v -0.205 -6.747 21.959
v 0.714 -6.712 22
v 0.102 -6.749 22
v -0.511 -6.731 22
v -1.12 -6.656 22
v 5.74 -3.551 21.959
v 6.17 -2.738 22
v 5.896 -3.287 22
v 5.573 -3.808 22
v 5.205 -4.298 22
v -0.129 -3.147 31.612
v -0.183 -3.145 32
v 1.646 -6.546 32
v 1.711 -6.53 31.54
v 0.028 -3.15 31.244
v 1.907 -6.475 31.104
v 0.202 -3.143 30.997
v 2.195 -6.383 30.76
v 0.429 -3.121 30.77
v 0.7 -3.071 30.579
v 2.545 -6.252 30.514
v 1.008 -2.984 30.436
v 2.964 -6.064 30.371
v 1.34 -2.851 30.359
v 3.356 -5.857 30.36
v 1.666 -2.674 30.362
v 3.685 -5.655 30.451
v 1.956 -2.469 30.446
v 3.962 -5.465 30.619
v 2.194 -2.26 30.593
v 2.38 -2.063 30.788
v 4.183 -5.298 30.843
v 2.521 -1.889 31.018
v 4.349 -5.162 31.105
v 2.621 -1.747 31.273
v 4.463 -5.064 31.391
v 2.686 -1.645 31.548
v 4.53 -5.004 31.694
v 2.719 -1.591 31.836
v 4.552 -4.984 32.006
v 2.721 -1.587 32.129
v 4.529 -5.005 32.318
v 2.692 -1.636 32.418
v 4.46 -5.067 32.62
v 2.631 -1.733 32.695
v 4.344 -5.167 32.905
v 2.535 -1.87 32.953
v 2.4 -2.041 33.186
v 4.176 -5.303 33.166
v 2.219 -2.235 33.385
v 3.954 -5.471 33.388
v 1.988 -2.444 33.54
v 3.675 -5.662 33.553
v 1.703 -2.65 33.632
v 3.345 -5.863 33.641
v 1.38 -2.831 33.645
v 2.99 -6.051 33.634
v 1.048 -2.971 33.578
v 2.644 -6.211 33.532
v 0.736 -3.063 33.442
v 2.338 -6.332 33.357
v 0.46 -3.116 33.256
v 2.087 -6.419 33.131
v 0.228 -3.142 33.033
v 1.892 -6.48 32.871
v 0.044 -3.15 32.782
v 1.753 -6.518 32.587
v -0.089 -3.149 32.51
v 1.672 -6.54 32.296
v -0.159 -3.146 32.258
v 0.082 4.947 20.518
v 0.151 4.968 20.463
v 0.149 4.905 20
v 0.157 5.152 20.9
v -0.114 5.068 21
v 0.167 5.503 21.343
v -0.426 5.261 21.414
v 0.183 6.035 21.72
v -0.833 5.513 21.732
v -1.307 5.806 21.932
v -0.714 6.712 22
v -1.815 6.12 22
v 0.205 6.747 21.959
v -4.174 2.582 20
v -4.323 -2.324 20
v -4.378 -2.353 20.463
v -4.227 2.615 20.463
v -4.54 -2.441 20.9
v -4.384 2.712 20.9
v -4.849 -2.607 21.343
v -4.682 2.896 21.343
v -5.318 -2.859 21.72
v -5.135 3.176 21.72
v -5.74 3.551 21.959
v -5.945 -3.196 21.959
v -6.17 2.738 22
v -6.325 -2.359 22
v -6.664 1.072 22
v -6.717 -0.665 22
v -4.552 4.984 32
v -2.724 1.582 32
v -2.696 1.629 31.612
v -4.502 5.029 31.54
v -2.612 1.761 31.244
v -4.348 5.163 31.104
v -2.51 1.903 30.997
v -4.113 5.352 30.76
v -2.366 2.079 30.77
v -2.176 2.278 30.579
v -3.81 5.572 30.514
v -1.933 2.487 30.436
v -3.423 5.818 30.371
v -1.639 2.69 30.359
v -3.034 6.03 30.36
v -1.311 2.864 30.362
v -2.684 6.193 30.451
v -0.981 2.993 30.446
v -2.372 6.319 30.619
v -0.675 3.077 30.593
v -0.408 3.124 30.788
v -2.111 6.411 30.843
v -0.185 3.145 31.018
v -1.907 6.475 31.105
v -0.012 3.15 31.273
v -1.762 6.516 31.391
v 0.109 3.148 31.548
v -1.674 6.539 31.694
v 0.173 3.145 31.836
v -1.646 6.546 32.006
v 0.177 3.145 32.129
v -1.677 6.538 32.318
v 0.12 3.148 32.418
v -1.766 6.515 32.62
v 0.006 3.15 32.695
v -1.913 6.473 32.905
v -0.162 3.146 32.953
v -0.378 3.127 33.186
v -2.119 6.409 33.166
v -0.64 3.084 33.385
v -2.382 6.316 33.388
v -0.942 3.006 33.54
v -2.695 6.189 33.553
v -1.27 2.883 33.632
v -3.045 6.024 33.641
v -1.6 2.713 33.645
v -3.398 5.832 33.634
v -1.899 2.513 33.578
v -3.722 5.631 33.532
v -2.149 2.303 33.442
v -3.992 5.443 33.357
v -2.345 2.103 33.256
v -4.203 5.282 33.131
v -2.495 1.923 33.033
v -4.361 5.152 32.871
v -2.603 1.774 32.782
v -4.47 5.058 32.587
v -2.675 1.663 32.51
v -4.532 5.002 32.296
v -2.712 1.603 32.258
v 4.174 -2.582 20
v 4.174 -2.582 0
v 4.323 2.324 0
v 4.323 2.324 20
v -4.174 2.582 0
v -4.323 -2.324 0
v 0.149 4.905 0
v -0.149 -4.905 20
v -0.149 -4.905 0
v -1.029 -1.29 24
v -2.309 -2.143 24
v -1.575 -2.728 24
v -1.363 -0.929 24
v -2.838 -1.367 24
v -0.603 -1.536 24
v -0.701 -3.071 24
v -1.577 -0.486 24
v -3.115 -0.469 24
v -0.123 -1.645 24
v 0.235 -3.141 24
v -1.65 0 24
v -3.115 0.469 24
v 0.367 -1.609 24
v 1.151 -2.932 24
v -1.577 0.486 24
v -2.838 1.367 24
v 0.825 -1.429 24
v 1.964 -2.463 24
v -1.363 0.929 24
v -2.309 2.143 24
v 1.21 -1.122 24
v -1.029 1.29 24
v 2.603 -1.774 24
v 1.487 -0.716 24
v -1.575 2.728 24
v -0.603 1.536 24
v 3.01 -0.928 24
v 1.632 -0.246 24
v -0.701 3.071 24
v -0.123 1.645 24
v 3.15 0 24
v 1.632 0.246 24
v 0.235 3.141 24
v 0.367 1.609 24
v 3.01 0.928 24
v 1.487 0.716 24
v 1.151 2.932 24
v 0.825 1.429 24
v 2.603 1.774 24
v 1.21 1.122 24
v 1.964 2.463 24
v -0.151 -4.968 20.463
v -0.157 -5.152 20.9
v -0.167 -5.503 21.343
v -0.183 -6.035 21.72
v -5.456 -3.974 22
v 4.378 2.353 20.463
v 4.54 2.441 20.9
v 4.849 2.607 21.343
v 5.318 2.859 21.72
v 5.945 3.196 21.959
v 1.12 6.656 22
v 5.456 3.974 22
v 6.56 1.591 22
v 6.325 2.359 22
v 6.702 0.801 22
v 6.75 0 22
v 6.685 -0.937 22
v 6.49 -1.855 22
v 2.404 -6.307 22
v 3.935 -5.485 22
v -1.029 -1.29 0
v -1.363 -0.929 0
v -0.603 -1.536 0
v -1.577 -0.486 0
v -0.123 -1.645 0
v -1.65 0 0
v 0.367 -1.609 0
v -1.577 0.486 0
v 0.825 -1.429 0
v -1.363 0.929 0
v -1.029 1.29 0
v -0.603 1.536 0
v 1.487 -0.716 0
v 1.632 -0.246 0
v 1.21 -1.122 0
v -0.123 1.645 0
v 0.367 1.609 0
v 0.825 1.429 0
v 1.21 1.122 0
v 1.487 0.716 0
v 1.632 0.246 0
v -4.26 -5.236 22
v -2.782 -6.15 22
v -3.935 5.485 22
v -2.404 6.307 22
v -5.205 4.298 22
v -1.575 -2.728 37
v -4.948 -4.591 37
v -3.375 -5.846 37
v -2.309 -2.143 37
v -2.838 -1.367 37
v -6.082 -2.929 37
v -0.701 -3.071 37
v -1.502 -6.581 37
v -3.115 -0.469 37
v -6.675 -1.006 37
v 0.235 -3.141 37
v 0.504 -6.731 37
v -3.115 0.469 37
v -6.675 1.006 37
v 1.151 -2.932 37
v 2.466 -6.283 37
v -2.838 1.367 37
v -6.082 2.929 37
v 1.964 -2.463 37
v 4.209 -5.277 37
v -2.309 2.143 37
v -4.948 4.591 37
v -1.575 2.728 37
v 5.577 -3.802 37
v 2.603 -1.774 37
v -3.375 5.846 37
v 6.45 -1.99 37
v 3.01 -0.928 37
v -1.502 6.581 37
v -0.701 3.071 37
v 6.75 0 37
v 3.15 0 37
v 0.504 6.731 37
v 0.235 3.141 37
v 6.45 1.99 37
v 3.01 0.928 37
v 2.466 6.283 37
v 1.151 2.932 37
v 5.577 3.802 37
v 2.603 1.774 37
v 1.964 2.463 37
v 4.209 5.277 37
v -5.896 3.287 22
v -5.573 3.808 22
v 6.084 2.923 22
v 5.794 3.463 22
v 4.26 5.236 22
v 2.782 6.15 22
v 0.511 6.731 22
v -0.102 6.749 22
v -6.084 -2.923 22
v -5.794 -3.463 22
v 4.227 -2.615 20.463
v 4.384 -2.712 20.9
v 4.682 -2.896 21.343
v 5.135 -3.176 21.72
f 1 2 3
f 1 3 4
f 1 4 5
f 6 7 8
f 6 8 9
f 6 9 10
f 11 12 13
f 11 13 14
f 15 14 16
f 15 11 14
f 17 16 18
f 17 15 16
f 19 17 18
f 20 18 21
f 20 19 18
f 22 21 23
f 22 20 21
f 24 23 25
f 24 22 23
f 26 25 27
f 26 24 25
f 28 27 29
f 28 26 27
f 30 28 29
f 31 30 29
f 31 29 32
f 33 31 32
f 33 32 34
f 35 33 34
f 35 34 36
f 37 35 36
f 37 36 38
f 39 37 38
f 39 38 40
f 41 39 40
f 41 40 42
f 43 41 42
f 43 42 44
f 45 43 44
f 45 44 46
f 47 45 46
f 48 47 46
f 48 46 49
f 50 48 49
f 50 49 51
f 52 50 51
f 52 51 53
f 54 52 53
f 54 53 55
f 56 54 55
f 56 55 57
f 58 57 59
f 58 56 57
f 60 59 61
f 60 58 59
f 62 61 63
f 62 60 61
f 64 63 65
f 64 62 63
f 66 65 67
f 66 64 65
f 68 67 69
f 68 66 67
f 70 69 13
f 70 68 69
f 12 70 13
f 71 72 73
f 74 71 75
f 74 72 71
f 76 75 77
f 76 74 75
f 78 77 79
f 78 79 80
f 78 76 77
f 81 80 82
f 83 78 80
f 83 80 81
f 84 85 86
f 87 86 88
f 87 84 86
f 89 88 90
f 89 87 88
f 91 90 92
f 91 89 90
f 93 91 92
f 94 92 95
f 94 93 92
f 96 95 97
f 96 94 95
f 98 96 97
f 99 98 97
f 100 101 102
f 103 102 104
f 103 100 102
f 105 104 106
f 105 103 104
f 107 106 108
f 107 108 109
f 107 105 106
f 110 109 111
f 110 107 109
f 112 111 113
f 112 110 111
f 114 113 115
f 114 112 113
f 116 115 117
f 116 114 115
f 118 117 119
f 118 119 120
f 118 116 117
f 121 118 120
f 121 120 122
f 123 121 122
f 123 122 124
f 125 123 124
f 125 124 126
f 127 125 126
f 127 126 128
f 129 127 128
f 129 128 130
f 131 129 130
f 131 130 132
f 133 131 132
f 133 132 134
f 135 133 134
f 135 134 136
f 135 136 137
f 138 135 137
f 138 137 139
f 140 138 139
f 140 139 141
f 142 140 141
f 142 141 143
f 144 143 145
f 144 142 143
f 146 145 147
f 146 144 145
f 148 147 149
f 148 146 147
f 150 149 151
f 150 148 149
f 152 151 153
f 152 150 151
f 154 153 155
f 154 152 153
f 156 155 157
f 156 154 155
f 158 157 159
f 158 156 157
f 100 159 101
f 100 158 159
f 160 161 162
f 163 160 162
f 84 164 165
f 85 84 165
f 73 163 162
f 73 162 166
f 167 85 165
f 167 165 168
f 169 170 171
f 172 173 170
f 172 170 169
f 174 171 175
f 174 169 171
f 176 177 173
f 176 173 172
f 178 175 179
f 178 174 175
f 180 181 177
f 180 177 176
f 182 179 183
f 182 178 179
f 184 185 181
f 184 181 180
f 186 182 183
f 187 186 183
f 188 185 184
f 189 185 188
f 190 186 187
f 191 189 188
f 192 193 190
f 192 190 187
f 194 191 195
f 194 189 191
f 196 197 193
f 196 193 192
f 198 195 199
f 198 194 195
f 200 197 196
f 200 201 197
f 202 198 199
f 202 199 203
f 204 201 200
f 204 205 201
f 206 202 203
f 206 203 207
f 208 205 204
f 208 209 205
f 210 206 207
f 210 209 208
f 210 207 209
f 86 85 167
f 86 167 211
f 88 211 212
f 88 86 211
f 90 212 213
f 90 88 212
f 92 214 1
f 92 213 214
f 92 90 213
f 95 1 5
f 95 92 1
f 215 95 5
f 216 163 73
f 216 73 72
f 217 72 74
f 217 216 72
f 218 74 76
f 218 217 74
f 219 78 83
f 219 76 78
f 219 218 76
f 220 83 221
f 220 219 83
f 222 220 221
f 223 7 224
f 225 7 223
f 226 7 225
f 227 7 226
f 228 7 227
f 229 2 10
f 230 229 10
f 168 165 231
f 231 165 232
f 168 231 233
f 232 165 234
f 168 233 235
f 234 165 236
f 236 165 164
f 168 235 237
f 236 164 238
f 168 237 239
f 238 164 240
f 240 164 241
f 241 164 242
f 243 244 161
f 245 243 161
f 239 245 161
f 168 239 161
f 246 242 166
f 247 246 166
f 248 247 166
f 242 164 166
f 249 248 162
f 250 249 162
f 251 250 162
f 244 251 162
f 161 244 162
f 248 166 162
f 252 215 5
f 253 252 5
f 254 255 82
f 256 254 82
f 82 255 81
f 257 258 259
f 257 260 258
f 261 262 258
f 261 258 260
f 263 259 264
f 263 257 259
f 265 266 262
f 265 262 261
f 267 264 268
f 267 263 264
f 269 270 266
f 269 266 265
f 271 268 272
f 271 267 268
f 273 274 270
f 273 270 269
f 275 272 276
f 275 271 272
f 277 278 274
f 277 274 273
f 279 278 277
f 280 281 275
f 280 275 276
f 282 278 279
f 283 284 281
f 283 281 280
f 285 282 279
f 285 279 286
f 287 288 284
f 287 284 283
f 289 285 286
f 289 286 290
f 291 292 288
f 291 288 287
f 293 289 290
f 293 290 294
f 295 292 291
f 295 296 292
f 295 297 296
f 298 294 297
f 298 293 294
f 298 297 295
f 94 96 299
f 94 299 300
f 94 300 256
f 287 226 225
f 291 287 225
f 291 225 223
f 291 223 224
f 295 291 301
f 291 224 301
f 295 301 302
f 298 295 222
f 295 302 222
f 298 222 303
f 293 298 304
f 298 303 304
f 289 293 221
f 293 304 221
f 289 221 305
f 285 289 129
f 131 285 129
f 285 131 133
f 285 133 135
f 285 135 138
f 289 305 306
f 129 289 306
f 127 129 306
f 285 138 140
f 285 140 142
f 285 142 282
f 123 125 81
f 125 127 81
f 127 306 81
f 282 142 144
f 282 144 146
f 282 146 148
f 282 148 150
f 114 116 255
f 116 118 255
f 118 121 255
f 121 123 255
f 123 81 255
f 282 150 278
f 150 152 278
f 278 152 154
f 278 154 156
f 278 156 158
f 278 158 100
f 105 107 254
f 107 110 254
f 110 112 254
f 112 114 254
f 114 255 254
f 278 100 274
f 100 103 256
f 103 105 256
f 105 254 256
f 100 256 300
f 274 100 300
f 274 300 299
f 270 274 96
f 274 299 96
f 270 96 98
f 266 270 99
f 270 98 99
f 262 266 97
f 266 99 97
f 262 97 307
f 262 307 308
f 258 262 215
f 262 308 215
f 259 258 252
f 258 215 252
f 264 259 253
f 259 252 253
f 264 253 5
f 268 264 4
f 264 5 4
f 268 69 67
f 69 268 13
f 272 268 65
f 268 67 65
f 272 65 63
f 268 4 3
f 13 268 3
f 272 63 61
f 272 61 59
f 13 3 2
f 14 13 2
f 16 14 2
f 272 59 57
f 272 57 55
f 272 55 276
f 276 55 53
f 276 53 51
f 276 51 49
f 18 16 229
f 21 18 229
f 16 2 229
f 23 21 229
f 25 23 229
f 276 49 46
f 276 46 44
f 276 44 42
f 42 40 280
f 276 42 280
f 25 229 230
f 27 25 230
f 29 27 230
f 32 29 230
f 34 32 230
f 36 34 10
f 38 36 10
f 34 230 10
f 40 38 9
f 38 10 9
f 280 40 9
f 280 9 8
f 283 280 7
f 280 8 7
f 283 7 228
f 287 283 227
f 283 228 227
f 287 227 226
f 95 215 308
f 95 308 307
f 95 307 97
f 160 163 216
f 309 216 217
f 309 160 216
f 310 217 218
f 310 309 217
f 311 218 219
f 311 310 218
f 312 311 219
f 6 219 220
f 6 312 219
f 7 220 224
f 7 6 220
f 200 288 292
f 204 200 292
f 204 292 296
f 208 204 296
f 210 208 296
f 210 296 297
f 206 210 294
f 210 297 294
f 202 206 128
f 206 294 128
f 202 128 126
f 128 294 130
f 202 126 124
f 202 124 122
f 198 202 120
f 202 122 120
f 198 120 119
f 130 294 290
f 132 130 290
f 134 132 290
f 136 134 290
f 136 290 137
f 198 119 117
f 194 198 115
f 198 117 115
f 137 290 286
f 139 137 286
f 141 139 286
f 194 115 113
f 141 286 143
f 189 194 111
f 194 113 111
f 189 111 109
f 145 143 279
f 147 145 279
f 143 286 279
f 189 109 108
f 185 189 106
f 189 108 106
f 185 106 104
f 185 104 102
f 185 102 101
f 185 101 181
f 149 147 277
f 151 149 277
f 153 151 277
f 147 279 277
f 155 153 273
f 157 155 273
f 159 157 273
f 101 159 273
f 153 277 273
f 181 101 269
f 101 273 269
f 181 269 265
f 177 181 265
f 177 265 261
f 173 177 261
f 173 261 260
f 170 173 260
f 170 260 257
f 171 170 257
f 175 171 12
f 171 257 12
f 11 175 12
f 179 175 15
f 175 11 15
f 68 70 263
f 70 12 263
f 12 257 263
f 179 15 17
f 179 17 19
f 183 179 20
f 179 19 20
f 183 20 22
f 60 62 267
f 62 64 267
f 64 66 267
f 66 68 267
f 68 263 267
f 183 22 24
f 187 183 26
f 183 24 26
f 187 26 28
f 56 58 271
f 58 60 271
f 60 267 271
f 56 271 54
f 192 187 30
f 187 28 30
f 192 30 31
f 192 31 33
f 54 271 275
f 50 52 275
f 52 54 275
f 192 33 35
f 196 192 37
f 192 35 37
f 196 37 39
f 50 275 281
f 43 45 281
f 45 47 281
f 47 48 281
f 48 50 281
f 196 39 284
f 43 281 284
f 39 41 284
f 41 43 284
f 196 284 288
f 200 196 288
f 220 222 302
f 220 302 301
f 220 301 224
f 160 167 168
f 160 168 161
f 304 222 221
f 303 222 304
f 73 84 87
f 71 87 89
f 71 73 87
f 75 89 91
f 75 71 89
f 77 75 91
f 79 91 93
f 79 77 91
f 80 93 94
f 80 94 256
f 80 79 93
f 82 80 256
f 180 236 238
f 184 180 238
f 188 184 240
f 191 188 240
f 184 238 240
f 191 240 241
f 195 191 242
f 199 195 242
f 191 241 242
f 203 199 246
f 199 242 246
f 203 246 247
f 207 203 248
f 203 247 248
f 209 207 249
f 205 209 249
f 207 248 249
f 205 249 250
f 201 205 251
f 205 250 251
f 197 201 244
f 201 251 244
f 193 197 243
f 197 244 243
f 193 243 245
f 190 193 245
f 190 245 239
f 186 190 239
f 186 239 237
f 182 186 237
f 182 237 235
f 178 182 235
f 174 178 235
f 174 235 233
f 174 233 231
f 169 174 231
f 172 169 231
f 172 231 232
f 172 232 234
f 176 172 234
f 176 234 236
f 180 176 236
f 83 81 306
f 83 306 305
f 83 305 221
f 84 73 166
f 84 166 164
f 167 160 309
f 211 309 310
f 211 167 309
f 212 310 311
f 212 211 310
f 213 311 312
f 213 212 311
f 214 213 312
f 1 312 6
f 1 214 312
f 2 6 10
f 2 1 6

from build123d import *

# Parameters (mm, degrees)
BOSS_EXTRUDE1_DEPTH     = 22
SKETCH2_R               = 6.75
BOSS_EXTRUDE2_DEPTH     = 15
SKETCH3_R               = 3.15
CUT_EXTRUDE1_DEPTH      = 13
FILLET2_R               = 2
CUT_EXTRUDE2_DEPTH      = 15
CUT_EXTRUDE2_DEPTH_BACK = 15
SKETCH8_R               = 1.65
SKETCH9_R               = 1.65
CUT_EXTRUDE3_DEPTH      = 25


with BuildPart() as part:
    # Sketch1 → Boss-Extrude1 (new body)
    with BuildSketch(Plane.XY):
        Polygon((4.322551167, 2.323550029), (0.149022231, 4.905214135), (-4.173528936, 2.581664105), (-4.322551167, -2.323550029), (-0.149022231, -4.905214135), (4.173528936, -2.581664105), align=None)
    extrude(amount=BOSS_EXTRUDE1_DEPTH)

    # Sketch2 → Boss-Extrude2 (add)
    with BuildSketch(Plane.XY.offset(22)):
        Circle(SKETCH2_R)
    extrude(amount=BOSS_EXTRUDE2_DEPTH)

    # Sketch3 → Cut-Extrude1 (cut)
    with BuildSketch(Plane.XY.offset(37)):
        Circle(SKETCH3_R)
    extrude(amount=-CUT_EXTRUDE1_DEPTH, mode=Mode.SUBTRACT)

    # Fillet2
    # the kernel refuses this fillet: 2 mm, written as the material it adds along each edge
    with BuildSketch(Plane(origin=(-4.021697127, 7.579358284, 22), x_dir=(-0.9995388356967246, 0.03036636188344198, 0), z_dir=(-0.03036636188344198, -0.9995388356967246, 0))) as fillet2_piece_1_section:
        with BuildLine():
            CenterArc((FILLET2_R, FILLET2_R), FILLET2_R, 180, 90)
            Line((0, FILLET2_R), (0, 0))
            Line((0, 0), (FILLET2_R, 0))
        make_face()
    fillet2_piece_1 = extrude(amount=14.907477288, mode=Mode.PRIVATE)
    fillet2_piece_1 = split(fillet2_piece_1, bisect_by=Plane(origin=(-5.562210671, 1.835190238, 21.518286734), z_dir=(0.47347137703679, -0.8808092047242047, 0)), keep=Keep.TOP, mode=Mode.PRIVATE)
    fillet2_piece_1 = split(fillet2_piece_1, bisect_by=Plane(origin=(-5.663357367, -1.494153303, 21.518286734), z_dir=(0.5260674586599345, 0.8504428428407627, 0)), keep=Keep.TOP, mode=Mode.PRIVATE)
    add(fillet2_piece_1)
    with BuildSketch(Plane(origin=(-8.574765382, 0.306787264, 22), x_dir=(-0.5260674586599345, -0.8504428428407627, 0), z_dir=(0.8504428428407627, -0.5260674586599345, 0))) as fillet2_piece_2_section:
        with BuildLine():
            CenterArc((FILLET2_R, FILLET2_R), FILLET2_R, 180, 90)
            Line((0, FILLET2_R), (0, 0))
            Line((0, 0), (FILLET2_R, 0))
        make_face()
    fillet2_piece_2 = extrude(amount=14.907477288, mode=Mode.PRIVATE)
    fillet2_piece_2 = split(fillet2_piece_2, bisect_by=Plane(origin=(-4.370426703, -3.899420623, 21.518286734), z_dir=(0.9995388356967246, -0.03036636188344198, 0)), keep=Keep.TOP, mode=Mode.PRIVATE)
    fillet2_piece_2 = split(fillet2_piece_2, bisect_by=Plane(origin=(-1.537703966, -5.651688002, 21.518286734), z_dir=(-0.47347137703679004, 0.8808092047242047, 0)), keep=Keep.TOP, mode=Mode.PRIVATE)
    add(fillet2_piece_2)
    with BuildSketch(Plane(origin=(-4.553068255, -7.27257102, 22), x_dir=(0.4734713770367901, -0.8808092047242048, 0), z_dir=(0.8808092047242047, 0.47347137703679004, 0))) as fillet2_piece_3_section:
        with BuildLine():
            CenterArc((FILLET2_R, FILLET2_R), FILLET2_R, 180, 90)
            Line((0, FILLET2_R), (0, 0))
            Line((0, 0), (FILLET2_R, 0))
        make_face()
    fillet2_piece_3 = extrude(amount=14.907477288, mode=Mode.PRIVATE)
    fillet2_piece_3 = split(fillet2_piece_3, bisect_by=Plane(origin=(1.191783968, -5.734610861, 21.518286734), z_dir=(0.5260674586599345, 0.8504428428407627, 0)), keep=Keep.TOP, mode=Mode.PRIVATE)
    fillet2_piece_3 = split(fillet2_piece_3, bisect_by=Plane(origin=(4.125653401, -4.157534699, 21.518286734), z_dir=(-0.9995388356967246, 0.03036636188344197, 0)), keep=Keep.TOP, mode=Mode.PRIVATE)
    add(fillet2_piece_3)
    with BuildSketch(Plane(origin=(4.021697127, -7.579358284, 22), x_dir=(0.9995388356967246, -0.03036636188344197, 0), z_dir=(0.03036636188344197, 0.9995388356967246, 0))) as fillet2_piece_4_section:
        with BuildLine():
            CenterArc((FILLET2_R, FILLET2_R), FILLET2_R, 180, 90)
            Line((0, FILLET2_R), (0, 0))
            Line((0, 0), (FILLET2_R, 0))
        make_face()
    fillet2_piece_4 = extrude(amount=14.907477288, mode=Mode.PRIVATE)
    fillet2_piece_4 = split(fillet2_piece_4, bisect_by=Plane(origin=(5.663357367, 1.494153303, 21.518286734), z_dir=(-0.5260674586599344, -0.8504428428407627, 0)), keep=Keep.TOP, mode=Mode.PRIVATE)
    fillet2_piece_4 = split(fillet2_piece_4, bisect_by=Plane(origin=(5.562210671, -1.835190238, 21.518286734), z_dir=(-0.47347137703679004, 0.8808092047242047, 0)), keep=Keep.TOP, mode=Mode.PRIVATE)
    add(fillet2_piece_4)
    with BuildSketch(Plane(origin=(8.574765382, -0.306787264, 22), x_dir=(0.5260674586599344, 0.8504428428407628, 0), z_dir=(-0.8504428428407627, 0.5260674586599344, 0))) as fillet2_piece_5_section:
        with BuildLine():
            CenterArc((FILLET2_R, FILLET2_R), FILLET2_R, 180, 90)
            Line((0, FILLET2_R), (0, 0))
            Line((0, 0), (FILLET2_R, 0))
        make_face()
    fillet2_piece_5 = extrude(amount=14.907477288, mode=Mode.PRIVATE)
    fillet2_piece_5 = split(fillet2_piece_5, bisect_by=Plane(origin=(4.370426703, 3.899420623, 21.518286734), z_dir=(-0.9995388356967246, 0.03036636188344197, 0)), keep=Keep.TOP, mode=Mode.PRIVATE)
    fillet2_piece_5 = split(fillet2_piece_5, bisect_by=Plane(origin=(1.537703966, 5.651688002, 21.518286734), z_dir=(0.47347137703679, -0.8808092047242047, 0)), keep=Keep.TOP, mode=Mode.PRIVATE)
    add(fillet2_piece_5)
    with BuildSketch(Plane(origin=(4.553068255, 7.27257102, 22), x_dir=(-0.47347137703678993, 0.8808092047242047, 0), z_dir=(-0.8808092047242047, -0.47347137703679, 0))) as fillet2_piece_6_section:
        with BuildLine():
            CenterArc((FILLET2_R, FILLET2_R), FILLET2_R, 180, 90)
            Line((0, FILLET2_R), (0, 0))
            Line((0, 0), (FILLET2_R, 0))
        make_face()
    fillet2_piece_6 = extrude(amount=14.907477288, mode=Mode.PRIVATE)
    fillet2_piece_6 = split(fillet2_piece_6, bisect_by=Plane(origin=(-1.191783968, 5.734610861, 21.518286734), z_dir=(-0.5260674586599344, -0.8504428428407627, 0)), keep=Keep.TOP, mode=Mode.PRIVATE)
    fillet2_piece_6 = split(fillet2_piece_6, bisect_by=Plane(origin=(-4.125653401, 4.157534699, 21.518286734), z_dir=(0.9995388356967246, -0.03036636188344198, 0)), keep=Keep.TOP, mode=Mode.PRIVATE)
    add(fillet2_piece_6)
    with BuildSketch(Plane(origin=(4.553068255, 7.27257102, 22), x_dir=(-0.47347137703678993, 0.8808092047242047, 0), z_dir=(-0.8808092047242047, -0.47347137703679, 0))) as fillet2_piece_7a_section:
        with BuildLine():
            CenterArc((FILLET2_R, FILLET2_R), FILLET2_R, 180, 90)
            Line((0, FILLET2_R), (0, 0))
            Line((0, 0), (FILLET2_R, 0))
        make_face()
    fillet2_piece_7a = extrude(amount=14.907477288, mode=Mode.PRIVATE)
    fillet2_piece_7a = fillet2_piece_7a & Plane(origin=(0, 0, 21.52699727), x_dir=(1, 0, 0), z_dir=(0, 0, -1)) * Cylinder(6.75, 38, mode=Mode.PRIVATE)
    fillet2_piece_7a = split(fillet2_piece_7a, bisect_by=Plane(origin=(-4.178945421, 2.403375135, 21.52699727), z_dir=(-0.9995388356967246, 0.03036636188344198, 0)), keep=Keep.TOP, mode=Mode.PRIVATE)
    with BuildSketch(Plane(origin=(-4.021697127, 7.579358284, 22), x_dir=(-0.9995388356967246, 0.03036636188344198, 0), z_dir=(-0.03036636188344198, -0.9995388356967246, 0))) as fillet2_piece_7b_section:
        with BuildLine():
            CenterArc((FILLET2_R, FILLET2_R), FILLET2_R, 180, 90)
            Line((0, FILLET2_R), (0, 0))
            Line((0, 0), (FILLET2_R, 0))
        make_face()
    fillet2_piece_7b = extrude(amount=14.907477288, mode=Mode.PRIVATE)
    fillet2_piece_7b = fillet2_piece_7b & Plane(origin=(0, 0, 21.526998099), x_dir=(1, 0, 0), z_dir=(0, 0, -1)) * Cylinder(6.75, 38, mode=Mode.PRIVATE)
    fillet2_piece_7b = split(fillet2_piece_7b, bisect_by=Plane(origin=(-4.016417327, 2.666118093, 21.526998099), z_dir=(-0.47347137703679, 0.8808092047242047, 0)), keep=Keep.TOP, mode=Mode.PRIVATE)
    fillet2_piece_7 = fillet2_piece_7a & fillet2_piece_7b
    add(fillet2_piece_7)
    with BuildSketch(Plane(origin=(-4.021697127, 7.579358284, 22), x_dir=(-0.9995388356967246, 0.03036636188344198, 0), z_dir=(-0.03036636188344198, -0.9995388356967246, 0))) as fillet2_piece_8a_section:
        with BuildLine():
            CenterArc((FILLET2_R, FILLET2_R), FILLET2_R, 180, 90)
            Line((0, FILLET2_R), (0, 0))
            Line((0, 0), (FILLET2_R, 0))
        make_face()
    fillet2_piece_8a = extrude(amount=14.907477288, mode=Mode.PRIVATE)
    fillet2_piece_8a = fillet2_piece_8a & Plane(origin=(0, 0, 21.52699727), x_dir=(1, 0, 0), z_dir=(0, 0, -1)) * Cylinder(6.75, 38, mode=Mode.PRIVATE)
    fillet2_piece_8a = split(fillet2_piece_8a, bisect_by=Plane(origin=(-4.170856632, -2.417385329, 21.52699727), z_dir=(-0.5260674586599345, -0.8504428428407627, 0)), keep=Keep.TOP, mode=Mode.PRIVATE)
    with BuildSketch(Plane(origin=(-8.574765382, 0.306787264, 22), x_dir=(-0.5260674586599345, -0.8504428428407627, 0), z_dir=(0.8504428428407627, -0.5260674586599345, 0))) as fillet2_piece_8b_section:
        with BuildLine():
            CenterArc((FILLET2_R, FILLET2_R), FILLET2_R, 180, 90)
            Line((0, FILLET2_R), (0, 0))
            Line((0, 0), (FILLET2_R, 0))
        make_face()
    fillet2_piece_8b = extrude(amount=14.907477288, mode=Mode.PRIVATE)
    fillet2_piece_8b = fillet2_piece_8b & Plane(origin=(0, 0, 21.526998099), x_dir=(1, 0, 0), z_dir=(0, 0, -1)) * Cylinder(6.75, 38, mode=Mode.PRIVATE)
    fillet2_piece_8b = split(fillet2_piece_8b, bisect_by=Plane(origin=(-4.317134662, -2.145260391, 21.526998099), z_dir=(-0.9995388356967246, 0.03036636188344198, 0)), keep=Keep.TOP, mode=Mode.PRIVATE)
    fillet2_piece_8 = fillet2_piece_8a & fillet2_piece_8b
    add(fillet2_piece_8)
    with BuildSketch(Plane(origin=(-8.574765382, 0.306787264, 22), x_dir=(-0.5260674586599345, -0.8504428428407627, 0), z_dir=(0.8504428428407627, -0.5260674586599345, 0))) as fillet2_piece_9a_section:
        with BuildLine():
            CenterArc((FILLET2_R, FILLET2_R), FILLET2_R, 180, 90)
            Line((0, FILLET2_R), (0, 0))
            Line((0, 0), (FILLET2_R, 0))
        make_face()
    fillet2_piece_9a = extrude(amount=14.907477288, mode=Mode.PRIVATE)
    fillet2_piece_9a = fillet2_piece_9a & Plane(origin=(0, 0, 21.52699727), x_dir=(1, 0, 0), z_dir=(0, 0, -1)) * Cylinder(6.75, 38, mode=Mode.PRIVATE)
    fillet2_piece_9a = split(fillet2_piece_9a, bisect_by=Plane(origin=(0.008088789, -4.820760463, 21.52699727), z_dir=(0.47347137703679004, -0.8808092047242047, 0)), keep=Keep.TOP, mode=Mode.PRIVATE)
    with BuildSketch(Plane(origin=(-4.553068255, -7.27257102, 22), x_dir=(0.4734713770367901, -0.8808092047242048, 0), z_dir=(0.8808092047242047, 0.47347137703679004, 0))) as fillet2_piece_9b_section:
        with BuildLine():
            CenterArc((FILLET2_R, FILLET2_R), FILLET2_R, 180, 90)
            Line((0, FILLET2_R), (0, 0))
            Line((0, 0), (FILLET2_R, 0))
        make_face()
    fillet2_piece_9b = extrude(amount=14.907477288, mode=Mode.PRIVATE)
    fillet2_piece_9b = fillet2_piece_9b & Plane(origin=(0, 0, 21.526998099), x_dir=(1, 0, 0), z_dir=(0, 0, -1)) * Cylinder(6.75, 38, mode=Mode.PRIVATE)
    fillet2_piece_9b = split(fillet2_piece_9b, bisect_by=Plane(origin=(-0.300717335, -4.811378484, 21.526998099), z_dir=(-0.5260674586599345, -0.8504428428407627, 0)), keep=Keep.TOP, mode=Mode.PRIVATE)
    fillet2_piece_9 = fillet2_piece_9a & fillet2_piece_9b
    add(fillet2_piece_9)
    with BuildSketch(Plane(origin=(-4.553068255, -7.27257102, 22), x_dir=(0.4734713770367901, -0.8808092047242048, 0), z_dir=(0.8808092047242047, 0.47347137703679004, 0))) as fillet2_piece_10a_section:
        with BuildLine():
            CenterArc((FILLET2_R, FILLET2_R), FILLET2_R, 180, 90)
            Line((0, FILLET2_R), (0, 0))
            Line((0, 0), (FILLET2_R, 0))
        make_face()
    fillet2_piece_10a = extrude(amount=14.907477288, mode=Mode.PRIVATE)
    fillet2_piece_10a = fillet2_piece_10a & Plane(origin=(0, 0, 21.52699727), x_dir=(1, 0, 0), z_dir=(0, 0, -1)) * Cylinder(6.75, 38, mode=Mode.PRIVATE)
    fillet2_piece_10a = split(fillet2_piece_10a, bisect_by=Plane(origin=(4.178945421, -2.403375135, 21.52699727), z_dir=(0.9995388356967246, -0.03036636188344197, 0)), keep=Keep.TOP, mode=Mode.PRIVATE)
    with BuildSketch(Plane(origin=(4.021697127, -7.579358284, 22), x_dir=(0.9995388356967246, -0.03036636188344197, 0), z_dir=(0.03036636188344197, 0.9995388356967246, 0))) as fillet2_piece_10b_section:
        with BuildLine():
            CenterArc((FILLET2_R, FILLET2_R), FILLET2_R, 180, 90)
            Line((0, FILLET2_R), (0, 0))
            Line((0, 0), (FILLET2_R, 0))
        make_face()
    fillet2_piece_10b = extrude(amount=14.907477288, mode=Mode.PRIVATE)
    fillet2_piece_10b = fillet2_piece_10b & Plane(origin=(0, 0, 21.526998099), x_dir=(1, 0, 0), z_dir=(0, 0, -1)) * Cylinder(6.75, 38, mode=Mode.PRIVATE)
    fillet2_piece_10b = split(fillet2_piece_10b, bisect_by=Plane(origin=(4.016417327, -2.666118093, 21.526998099), z_dir=(0.47347137703679004, -0.8808092047242047, 0)), keep=Keep.TOP, mode=Mode.PRIVATE)
    fillet2_piece_10 = fillet2_piece_10a & fillet2_piece_10b
    add(fillet2_piece_10)
    with BuildSketch(Plane(origin=(8.574765382, -0.306787264, 22), x_dir=(0.5260674586599344, 0.8504428428407628, 0), z_dir=(-0.8504428428407627, 0.5260674586599344, 0))) as fillet2_piece_11a_section:
        with BuildLine():
            CenterArc((FILLET2_R, FILLET2_R), FILLET2_R, 180, 90)
            Line((0, FILLET2_R), (0, 0))
            Line((0, 0), (FILLET2_R, 0))
        make_face()
    fillet2_piece_11a = extrude(amount=14.907477288, mode=Mode.PRIVATE)
    fillet2_piece_11a = fillet2_piece_11a & Plane(origin=(0, 0, 21.526998099), x_dir=(1, 0, 0), z_dir=(0, 0, -1)) * Cylinder(6.75, 38, mode=Mode.PRIVATE)
    fillet2_piece_11a = split(fillet2_piece_11a, bisect_by=Plane(origin=(4.317134662, 2.145260391, 21.526998099), z_dir=(0.9995388356967246, -0.03036636188344197, 0)), keep=Keep.TOP, mode=Mode.PRIVATE)
    with BuildSketch(Plane(origin=(4.021697127, -7.579358284, 22), x_dir=(0.9995388356967246, -0.03036636188344197, 0), z_dir=(0.03036636188344197, 0.9995388356967246, 0))) as fillet2_piece_11b_section:
        with BuildLine():
            CenterArc((FILLET2_R, FILLET2_R), FILLET2_R, 180, 90)
            Line((0, FILLET2_R), (0, 0))
            Line((0, 0), (FILLET2_R, 0))
        make_face()
    fillet2_piece_11b = extrude(amount=14.907477288, mode=Mode.PRIVATE)
    fillet2_piece_11b = fillet2_piece_11b & Plane(origin=(0, 0, 21.52699727), x_dir=(1, 0, 0), z_dir=(0, 0, -1)) * Cylinder(6.75, 38, mode=Mode.PRIVATE)
    fillet2_piece_11b = split(fillet2_piece_11b, bisect_by=Plane(origin=(4.170856632, 2.417385329, 21.52699727), z_dir=(0.5260674586599344, 0.8504428428407627, 0)), keep=Keep.TOP, mode=Mode.PRIVATE)
    fillet2_piece_11 = fillet2_piece_11a & fillet2_piece_11b
    add(fillet2_piece_11)
    with BuildSketch(Plane(origin=(8.574765382, -0.306787264, 22), x_dir=(0.5260674586599344, 0.8504428428407628, 0), z_dir=(-0.8504428428407627, 0.5260674586599344, 0))) as fillet2_piece_12a_section:
        with BuildLine():
            CenterArc((FILLET2_R, FILLET2_R), FILLET2_R, 180, 90)
            Line((0, FILLET2_R), (0, 0))
            Line((0, 0), (FILLET2_R, 0))
        make_face()
    fillet2_piece_12a = extrude(amount=14.907477288, mode=Mode.PRIVATE)
    fillet2_piece_12a = fillet2_piece_12a & Plane(origin=(0, 0, 21.52699727), x_dir=(1, 0, 0), z_dir=(0, 0, -1)) * Cylinder(6.75, 38, mode=Mode.PRIVATE)
    fillet2_piece_12a = split(fillet2_piece_12a, bisect_by=Plane(origin=(-0.008088789, 4.820760463, 21.52699727), z_dir=(-0.47347137703679, 0.8808092047242047, 0)), keep=Keep.TOP, mode=Mode.PRIVATE)
    with BuildSketch(Plane(origin=(4.553068255, 7.27257102, 22), x_dir=(-0.47347137703678993, 0.8808092047242047, 0), z_dir=(-0.8808092047242047, -0.47347137703679, 0))) as fillet2_piece_12b_section:
        with BuildLine():
            CenterArc((FILLET2_R, FILLET2_R), FILLET2_R, 180, 90)
            Line((0, FILLET2_R), (0, 0))
            Line((0, 0), (FILLET2_R, 0))
        make_face()
    fillet2_piece_12b = extrude(amount=14.907477288, mode=Mode.PRIVATE)
    fillet2_piece_12b = fillet2_piece_12b & Plane(origin=(0, 0, 21.526998099), x_dir=(1, 0, 0), z_dir=(0, 0, -1)) * Cylinder(6.75, 38, mode=Mode.PRIVATE)
    fillet2_piece_12b = split(fillet2_piece_12b, bisect_by=Plane(origin=(0.300717335, 4.811378484, 21.526998099), z_dir=(0.5260674586599344, 0.8504428428407627, 0)), keep=Keep.TOP, mode=Mode.PRIVATE)
    fillet2_piece_12 = fillet2_piece_12a & fillet2_piece_12b
    add(fillet2_piece_12)

    # Sketch8 → Cut-Extrude2 (cut, two sides: drawn at the far end of the back side and taken through both)
    with BuildSketch(Plane(origin=(2.012253352, -3.74343912, 0), x_dir=(-0.8808092047242045, -0.4734713770367903, 0), z_dir=(0.4734713770367903, -0.8808092047242045, 0)).offset(-CUT_EXTRUDE2_DEPTH_BACK)):
        with Locations((0, -32)):
            Circle(SKETCH8_R)
    extrude(amount=CUT_EXTRUDE2_DEPTH + CUT_EXTRUDE2_DEPTH_BACK, mode=Mode.SUBTRACT)

    # Sketch9 → Cut-Extrude3 (cut)
    with BuildSketch(Plane(origin=(0, 0, 0), x_dir=(-1, 0, 0), z_dir=(0, 0, -1))):
        Circle(SKETCH9_R)
    extrude(amount=-CUT_EXTRUDE3_DEPTH, mode=Mode.SUBTRACT)


solid = part.part
